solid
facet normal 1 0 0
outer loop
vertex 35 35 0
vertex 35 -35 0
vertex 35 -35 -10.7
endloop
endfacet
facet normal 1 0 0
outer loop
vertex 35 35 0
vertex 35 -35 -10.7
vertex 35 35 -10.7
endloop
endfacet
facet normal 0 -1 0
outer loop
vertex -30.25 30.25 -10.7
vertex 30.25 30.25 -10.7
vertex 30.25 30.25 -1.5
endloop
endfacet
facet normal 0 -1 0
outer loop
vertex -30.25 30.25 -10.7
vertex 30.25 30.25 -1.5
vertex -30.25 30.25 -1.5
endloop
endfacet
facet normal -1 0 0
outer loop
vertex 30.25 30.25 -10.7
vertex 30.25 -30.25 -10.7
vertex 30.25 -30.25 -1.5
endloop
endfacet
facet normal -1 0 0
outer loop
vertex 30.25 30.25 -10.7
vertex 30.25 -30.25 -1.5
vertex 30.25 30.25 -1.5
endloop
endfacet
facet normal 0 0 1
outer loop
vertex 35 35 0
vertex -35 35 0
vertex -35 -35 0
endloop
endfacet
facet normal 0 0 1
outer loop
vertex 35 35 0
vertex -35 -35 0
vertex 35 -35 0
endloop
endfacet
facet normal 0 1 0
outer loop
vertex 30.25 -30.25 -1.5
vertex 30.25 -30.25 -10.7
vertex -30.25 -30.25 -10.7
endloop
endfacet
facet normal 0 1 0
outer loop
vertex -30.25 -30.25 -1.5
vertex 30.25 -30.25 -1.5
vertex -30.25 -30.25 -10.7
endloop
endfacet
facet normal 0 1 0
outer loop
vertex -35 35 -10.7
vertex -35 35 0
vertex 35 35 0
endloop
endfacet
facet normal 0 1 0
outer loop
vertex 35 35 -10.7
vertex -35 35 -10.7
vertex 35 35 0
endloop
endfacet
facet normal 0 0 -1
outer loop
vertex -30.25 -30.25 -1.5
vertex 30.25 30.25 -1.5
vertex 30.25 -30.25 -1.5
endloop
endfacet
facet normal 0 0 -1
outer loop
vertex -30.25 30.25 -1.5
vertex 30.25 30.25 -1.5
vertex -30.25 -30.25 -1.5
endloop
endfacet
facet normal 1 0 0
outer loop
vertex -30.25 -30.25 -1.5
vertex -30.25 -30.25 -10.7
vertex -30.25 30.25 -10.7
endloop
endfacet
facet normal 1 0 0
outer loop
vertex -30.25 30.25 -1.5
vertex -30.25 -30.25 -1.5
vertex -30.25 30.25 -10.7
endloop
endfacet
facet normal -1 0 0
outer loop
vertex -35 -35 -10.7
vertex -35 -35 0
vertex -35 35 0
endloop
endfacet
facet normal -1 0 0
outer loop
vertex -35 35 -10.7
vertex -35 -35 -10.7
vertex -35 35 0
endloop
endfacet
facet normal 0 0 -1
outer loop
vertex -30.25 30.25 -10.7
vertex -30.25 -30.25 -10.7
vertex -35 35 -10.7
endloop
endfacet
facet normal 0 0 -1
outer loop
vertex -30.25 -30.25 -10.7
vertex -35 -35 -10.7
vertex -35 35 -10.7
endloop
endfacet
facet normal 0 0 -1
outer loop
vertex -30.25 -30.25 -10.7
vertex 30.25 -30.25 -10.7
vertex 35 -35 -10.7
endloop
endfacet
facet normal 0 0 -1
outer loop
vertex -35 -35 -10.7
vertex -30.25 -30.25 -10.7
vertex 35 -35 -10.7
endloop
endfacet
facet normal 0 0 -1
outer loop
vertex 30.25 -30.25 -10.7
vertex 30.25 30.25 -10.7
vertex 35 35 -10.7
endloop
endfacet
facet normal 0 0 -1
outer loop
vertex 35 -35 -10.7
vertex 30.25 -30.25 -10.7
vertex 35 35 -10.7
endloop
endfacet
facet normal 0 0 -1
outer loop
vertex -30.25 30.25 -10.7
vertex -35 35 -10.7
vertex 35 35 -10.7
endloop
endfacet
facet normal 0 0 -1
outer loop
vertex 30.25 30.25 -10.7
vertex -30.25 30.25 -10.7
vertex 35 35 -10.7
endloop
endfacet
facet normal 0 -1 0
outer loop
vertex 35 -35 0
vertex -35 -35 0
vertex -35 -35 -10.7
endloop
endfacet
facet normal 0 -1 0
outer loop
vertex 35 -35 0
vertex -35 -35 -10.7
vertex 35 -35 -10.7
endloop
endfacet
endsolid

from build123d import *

# Parameters (mm, degrees)
SKETCH_1_W          = 70
SKETCH_1_H          = 70
EXTRUDE_1_DEPTH     = 10.7
SKETCH_2_W          = 60.5
SKETCH_2_H          = 60.5
CUT_EXTRUDE_1_DEPTH = 9.2


with BuildPart() as part:
    # Эскиз1 → Бобышка-Вытянуть1 (new body)
    with BuildSketch(Plane.XY):
        Rectangle(SKETCH_1_W, SKETCH_1_H)
    extrude(amount=-EXTRUDE_1_DEPTH)

    # Эскиз2 → Вырез-Вытянуть1 (cut)
    with BuildSketch(Plane(origin=(0, 0, -10.7), x_dir=(-1, 0, 0), z_dir=(0, 0, -1))):
        Rectangle(SKETCH_2_W, SKETCH_2_H)
    extrude(amount=-CUT_EXTRUDE_1_DEPTH, mode=Mode.SUBTRACT)


solid = part.part
